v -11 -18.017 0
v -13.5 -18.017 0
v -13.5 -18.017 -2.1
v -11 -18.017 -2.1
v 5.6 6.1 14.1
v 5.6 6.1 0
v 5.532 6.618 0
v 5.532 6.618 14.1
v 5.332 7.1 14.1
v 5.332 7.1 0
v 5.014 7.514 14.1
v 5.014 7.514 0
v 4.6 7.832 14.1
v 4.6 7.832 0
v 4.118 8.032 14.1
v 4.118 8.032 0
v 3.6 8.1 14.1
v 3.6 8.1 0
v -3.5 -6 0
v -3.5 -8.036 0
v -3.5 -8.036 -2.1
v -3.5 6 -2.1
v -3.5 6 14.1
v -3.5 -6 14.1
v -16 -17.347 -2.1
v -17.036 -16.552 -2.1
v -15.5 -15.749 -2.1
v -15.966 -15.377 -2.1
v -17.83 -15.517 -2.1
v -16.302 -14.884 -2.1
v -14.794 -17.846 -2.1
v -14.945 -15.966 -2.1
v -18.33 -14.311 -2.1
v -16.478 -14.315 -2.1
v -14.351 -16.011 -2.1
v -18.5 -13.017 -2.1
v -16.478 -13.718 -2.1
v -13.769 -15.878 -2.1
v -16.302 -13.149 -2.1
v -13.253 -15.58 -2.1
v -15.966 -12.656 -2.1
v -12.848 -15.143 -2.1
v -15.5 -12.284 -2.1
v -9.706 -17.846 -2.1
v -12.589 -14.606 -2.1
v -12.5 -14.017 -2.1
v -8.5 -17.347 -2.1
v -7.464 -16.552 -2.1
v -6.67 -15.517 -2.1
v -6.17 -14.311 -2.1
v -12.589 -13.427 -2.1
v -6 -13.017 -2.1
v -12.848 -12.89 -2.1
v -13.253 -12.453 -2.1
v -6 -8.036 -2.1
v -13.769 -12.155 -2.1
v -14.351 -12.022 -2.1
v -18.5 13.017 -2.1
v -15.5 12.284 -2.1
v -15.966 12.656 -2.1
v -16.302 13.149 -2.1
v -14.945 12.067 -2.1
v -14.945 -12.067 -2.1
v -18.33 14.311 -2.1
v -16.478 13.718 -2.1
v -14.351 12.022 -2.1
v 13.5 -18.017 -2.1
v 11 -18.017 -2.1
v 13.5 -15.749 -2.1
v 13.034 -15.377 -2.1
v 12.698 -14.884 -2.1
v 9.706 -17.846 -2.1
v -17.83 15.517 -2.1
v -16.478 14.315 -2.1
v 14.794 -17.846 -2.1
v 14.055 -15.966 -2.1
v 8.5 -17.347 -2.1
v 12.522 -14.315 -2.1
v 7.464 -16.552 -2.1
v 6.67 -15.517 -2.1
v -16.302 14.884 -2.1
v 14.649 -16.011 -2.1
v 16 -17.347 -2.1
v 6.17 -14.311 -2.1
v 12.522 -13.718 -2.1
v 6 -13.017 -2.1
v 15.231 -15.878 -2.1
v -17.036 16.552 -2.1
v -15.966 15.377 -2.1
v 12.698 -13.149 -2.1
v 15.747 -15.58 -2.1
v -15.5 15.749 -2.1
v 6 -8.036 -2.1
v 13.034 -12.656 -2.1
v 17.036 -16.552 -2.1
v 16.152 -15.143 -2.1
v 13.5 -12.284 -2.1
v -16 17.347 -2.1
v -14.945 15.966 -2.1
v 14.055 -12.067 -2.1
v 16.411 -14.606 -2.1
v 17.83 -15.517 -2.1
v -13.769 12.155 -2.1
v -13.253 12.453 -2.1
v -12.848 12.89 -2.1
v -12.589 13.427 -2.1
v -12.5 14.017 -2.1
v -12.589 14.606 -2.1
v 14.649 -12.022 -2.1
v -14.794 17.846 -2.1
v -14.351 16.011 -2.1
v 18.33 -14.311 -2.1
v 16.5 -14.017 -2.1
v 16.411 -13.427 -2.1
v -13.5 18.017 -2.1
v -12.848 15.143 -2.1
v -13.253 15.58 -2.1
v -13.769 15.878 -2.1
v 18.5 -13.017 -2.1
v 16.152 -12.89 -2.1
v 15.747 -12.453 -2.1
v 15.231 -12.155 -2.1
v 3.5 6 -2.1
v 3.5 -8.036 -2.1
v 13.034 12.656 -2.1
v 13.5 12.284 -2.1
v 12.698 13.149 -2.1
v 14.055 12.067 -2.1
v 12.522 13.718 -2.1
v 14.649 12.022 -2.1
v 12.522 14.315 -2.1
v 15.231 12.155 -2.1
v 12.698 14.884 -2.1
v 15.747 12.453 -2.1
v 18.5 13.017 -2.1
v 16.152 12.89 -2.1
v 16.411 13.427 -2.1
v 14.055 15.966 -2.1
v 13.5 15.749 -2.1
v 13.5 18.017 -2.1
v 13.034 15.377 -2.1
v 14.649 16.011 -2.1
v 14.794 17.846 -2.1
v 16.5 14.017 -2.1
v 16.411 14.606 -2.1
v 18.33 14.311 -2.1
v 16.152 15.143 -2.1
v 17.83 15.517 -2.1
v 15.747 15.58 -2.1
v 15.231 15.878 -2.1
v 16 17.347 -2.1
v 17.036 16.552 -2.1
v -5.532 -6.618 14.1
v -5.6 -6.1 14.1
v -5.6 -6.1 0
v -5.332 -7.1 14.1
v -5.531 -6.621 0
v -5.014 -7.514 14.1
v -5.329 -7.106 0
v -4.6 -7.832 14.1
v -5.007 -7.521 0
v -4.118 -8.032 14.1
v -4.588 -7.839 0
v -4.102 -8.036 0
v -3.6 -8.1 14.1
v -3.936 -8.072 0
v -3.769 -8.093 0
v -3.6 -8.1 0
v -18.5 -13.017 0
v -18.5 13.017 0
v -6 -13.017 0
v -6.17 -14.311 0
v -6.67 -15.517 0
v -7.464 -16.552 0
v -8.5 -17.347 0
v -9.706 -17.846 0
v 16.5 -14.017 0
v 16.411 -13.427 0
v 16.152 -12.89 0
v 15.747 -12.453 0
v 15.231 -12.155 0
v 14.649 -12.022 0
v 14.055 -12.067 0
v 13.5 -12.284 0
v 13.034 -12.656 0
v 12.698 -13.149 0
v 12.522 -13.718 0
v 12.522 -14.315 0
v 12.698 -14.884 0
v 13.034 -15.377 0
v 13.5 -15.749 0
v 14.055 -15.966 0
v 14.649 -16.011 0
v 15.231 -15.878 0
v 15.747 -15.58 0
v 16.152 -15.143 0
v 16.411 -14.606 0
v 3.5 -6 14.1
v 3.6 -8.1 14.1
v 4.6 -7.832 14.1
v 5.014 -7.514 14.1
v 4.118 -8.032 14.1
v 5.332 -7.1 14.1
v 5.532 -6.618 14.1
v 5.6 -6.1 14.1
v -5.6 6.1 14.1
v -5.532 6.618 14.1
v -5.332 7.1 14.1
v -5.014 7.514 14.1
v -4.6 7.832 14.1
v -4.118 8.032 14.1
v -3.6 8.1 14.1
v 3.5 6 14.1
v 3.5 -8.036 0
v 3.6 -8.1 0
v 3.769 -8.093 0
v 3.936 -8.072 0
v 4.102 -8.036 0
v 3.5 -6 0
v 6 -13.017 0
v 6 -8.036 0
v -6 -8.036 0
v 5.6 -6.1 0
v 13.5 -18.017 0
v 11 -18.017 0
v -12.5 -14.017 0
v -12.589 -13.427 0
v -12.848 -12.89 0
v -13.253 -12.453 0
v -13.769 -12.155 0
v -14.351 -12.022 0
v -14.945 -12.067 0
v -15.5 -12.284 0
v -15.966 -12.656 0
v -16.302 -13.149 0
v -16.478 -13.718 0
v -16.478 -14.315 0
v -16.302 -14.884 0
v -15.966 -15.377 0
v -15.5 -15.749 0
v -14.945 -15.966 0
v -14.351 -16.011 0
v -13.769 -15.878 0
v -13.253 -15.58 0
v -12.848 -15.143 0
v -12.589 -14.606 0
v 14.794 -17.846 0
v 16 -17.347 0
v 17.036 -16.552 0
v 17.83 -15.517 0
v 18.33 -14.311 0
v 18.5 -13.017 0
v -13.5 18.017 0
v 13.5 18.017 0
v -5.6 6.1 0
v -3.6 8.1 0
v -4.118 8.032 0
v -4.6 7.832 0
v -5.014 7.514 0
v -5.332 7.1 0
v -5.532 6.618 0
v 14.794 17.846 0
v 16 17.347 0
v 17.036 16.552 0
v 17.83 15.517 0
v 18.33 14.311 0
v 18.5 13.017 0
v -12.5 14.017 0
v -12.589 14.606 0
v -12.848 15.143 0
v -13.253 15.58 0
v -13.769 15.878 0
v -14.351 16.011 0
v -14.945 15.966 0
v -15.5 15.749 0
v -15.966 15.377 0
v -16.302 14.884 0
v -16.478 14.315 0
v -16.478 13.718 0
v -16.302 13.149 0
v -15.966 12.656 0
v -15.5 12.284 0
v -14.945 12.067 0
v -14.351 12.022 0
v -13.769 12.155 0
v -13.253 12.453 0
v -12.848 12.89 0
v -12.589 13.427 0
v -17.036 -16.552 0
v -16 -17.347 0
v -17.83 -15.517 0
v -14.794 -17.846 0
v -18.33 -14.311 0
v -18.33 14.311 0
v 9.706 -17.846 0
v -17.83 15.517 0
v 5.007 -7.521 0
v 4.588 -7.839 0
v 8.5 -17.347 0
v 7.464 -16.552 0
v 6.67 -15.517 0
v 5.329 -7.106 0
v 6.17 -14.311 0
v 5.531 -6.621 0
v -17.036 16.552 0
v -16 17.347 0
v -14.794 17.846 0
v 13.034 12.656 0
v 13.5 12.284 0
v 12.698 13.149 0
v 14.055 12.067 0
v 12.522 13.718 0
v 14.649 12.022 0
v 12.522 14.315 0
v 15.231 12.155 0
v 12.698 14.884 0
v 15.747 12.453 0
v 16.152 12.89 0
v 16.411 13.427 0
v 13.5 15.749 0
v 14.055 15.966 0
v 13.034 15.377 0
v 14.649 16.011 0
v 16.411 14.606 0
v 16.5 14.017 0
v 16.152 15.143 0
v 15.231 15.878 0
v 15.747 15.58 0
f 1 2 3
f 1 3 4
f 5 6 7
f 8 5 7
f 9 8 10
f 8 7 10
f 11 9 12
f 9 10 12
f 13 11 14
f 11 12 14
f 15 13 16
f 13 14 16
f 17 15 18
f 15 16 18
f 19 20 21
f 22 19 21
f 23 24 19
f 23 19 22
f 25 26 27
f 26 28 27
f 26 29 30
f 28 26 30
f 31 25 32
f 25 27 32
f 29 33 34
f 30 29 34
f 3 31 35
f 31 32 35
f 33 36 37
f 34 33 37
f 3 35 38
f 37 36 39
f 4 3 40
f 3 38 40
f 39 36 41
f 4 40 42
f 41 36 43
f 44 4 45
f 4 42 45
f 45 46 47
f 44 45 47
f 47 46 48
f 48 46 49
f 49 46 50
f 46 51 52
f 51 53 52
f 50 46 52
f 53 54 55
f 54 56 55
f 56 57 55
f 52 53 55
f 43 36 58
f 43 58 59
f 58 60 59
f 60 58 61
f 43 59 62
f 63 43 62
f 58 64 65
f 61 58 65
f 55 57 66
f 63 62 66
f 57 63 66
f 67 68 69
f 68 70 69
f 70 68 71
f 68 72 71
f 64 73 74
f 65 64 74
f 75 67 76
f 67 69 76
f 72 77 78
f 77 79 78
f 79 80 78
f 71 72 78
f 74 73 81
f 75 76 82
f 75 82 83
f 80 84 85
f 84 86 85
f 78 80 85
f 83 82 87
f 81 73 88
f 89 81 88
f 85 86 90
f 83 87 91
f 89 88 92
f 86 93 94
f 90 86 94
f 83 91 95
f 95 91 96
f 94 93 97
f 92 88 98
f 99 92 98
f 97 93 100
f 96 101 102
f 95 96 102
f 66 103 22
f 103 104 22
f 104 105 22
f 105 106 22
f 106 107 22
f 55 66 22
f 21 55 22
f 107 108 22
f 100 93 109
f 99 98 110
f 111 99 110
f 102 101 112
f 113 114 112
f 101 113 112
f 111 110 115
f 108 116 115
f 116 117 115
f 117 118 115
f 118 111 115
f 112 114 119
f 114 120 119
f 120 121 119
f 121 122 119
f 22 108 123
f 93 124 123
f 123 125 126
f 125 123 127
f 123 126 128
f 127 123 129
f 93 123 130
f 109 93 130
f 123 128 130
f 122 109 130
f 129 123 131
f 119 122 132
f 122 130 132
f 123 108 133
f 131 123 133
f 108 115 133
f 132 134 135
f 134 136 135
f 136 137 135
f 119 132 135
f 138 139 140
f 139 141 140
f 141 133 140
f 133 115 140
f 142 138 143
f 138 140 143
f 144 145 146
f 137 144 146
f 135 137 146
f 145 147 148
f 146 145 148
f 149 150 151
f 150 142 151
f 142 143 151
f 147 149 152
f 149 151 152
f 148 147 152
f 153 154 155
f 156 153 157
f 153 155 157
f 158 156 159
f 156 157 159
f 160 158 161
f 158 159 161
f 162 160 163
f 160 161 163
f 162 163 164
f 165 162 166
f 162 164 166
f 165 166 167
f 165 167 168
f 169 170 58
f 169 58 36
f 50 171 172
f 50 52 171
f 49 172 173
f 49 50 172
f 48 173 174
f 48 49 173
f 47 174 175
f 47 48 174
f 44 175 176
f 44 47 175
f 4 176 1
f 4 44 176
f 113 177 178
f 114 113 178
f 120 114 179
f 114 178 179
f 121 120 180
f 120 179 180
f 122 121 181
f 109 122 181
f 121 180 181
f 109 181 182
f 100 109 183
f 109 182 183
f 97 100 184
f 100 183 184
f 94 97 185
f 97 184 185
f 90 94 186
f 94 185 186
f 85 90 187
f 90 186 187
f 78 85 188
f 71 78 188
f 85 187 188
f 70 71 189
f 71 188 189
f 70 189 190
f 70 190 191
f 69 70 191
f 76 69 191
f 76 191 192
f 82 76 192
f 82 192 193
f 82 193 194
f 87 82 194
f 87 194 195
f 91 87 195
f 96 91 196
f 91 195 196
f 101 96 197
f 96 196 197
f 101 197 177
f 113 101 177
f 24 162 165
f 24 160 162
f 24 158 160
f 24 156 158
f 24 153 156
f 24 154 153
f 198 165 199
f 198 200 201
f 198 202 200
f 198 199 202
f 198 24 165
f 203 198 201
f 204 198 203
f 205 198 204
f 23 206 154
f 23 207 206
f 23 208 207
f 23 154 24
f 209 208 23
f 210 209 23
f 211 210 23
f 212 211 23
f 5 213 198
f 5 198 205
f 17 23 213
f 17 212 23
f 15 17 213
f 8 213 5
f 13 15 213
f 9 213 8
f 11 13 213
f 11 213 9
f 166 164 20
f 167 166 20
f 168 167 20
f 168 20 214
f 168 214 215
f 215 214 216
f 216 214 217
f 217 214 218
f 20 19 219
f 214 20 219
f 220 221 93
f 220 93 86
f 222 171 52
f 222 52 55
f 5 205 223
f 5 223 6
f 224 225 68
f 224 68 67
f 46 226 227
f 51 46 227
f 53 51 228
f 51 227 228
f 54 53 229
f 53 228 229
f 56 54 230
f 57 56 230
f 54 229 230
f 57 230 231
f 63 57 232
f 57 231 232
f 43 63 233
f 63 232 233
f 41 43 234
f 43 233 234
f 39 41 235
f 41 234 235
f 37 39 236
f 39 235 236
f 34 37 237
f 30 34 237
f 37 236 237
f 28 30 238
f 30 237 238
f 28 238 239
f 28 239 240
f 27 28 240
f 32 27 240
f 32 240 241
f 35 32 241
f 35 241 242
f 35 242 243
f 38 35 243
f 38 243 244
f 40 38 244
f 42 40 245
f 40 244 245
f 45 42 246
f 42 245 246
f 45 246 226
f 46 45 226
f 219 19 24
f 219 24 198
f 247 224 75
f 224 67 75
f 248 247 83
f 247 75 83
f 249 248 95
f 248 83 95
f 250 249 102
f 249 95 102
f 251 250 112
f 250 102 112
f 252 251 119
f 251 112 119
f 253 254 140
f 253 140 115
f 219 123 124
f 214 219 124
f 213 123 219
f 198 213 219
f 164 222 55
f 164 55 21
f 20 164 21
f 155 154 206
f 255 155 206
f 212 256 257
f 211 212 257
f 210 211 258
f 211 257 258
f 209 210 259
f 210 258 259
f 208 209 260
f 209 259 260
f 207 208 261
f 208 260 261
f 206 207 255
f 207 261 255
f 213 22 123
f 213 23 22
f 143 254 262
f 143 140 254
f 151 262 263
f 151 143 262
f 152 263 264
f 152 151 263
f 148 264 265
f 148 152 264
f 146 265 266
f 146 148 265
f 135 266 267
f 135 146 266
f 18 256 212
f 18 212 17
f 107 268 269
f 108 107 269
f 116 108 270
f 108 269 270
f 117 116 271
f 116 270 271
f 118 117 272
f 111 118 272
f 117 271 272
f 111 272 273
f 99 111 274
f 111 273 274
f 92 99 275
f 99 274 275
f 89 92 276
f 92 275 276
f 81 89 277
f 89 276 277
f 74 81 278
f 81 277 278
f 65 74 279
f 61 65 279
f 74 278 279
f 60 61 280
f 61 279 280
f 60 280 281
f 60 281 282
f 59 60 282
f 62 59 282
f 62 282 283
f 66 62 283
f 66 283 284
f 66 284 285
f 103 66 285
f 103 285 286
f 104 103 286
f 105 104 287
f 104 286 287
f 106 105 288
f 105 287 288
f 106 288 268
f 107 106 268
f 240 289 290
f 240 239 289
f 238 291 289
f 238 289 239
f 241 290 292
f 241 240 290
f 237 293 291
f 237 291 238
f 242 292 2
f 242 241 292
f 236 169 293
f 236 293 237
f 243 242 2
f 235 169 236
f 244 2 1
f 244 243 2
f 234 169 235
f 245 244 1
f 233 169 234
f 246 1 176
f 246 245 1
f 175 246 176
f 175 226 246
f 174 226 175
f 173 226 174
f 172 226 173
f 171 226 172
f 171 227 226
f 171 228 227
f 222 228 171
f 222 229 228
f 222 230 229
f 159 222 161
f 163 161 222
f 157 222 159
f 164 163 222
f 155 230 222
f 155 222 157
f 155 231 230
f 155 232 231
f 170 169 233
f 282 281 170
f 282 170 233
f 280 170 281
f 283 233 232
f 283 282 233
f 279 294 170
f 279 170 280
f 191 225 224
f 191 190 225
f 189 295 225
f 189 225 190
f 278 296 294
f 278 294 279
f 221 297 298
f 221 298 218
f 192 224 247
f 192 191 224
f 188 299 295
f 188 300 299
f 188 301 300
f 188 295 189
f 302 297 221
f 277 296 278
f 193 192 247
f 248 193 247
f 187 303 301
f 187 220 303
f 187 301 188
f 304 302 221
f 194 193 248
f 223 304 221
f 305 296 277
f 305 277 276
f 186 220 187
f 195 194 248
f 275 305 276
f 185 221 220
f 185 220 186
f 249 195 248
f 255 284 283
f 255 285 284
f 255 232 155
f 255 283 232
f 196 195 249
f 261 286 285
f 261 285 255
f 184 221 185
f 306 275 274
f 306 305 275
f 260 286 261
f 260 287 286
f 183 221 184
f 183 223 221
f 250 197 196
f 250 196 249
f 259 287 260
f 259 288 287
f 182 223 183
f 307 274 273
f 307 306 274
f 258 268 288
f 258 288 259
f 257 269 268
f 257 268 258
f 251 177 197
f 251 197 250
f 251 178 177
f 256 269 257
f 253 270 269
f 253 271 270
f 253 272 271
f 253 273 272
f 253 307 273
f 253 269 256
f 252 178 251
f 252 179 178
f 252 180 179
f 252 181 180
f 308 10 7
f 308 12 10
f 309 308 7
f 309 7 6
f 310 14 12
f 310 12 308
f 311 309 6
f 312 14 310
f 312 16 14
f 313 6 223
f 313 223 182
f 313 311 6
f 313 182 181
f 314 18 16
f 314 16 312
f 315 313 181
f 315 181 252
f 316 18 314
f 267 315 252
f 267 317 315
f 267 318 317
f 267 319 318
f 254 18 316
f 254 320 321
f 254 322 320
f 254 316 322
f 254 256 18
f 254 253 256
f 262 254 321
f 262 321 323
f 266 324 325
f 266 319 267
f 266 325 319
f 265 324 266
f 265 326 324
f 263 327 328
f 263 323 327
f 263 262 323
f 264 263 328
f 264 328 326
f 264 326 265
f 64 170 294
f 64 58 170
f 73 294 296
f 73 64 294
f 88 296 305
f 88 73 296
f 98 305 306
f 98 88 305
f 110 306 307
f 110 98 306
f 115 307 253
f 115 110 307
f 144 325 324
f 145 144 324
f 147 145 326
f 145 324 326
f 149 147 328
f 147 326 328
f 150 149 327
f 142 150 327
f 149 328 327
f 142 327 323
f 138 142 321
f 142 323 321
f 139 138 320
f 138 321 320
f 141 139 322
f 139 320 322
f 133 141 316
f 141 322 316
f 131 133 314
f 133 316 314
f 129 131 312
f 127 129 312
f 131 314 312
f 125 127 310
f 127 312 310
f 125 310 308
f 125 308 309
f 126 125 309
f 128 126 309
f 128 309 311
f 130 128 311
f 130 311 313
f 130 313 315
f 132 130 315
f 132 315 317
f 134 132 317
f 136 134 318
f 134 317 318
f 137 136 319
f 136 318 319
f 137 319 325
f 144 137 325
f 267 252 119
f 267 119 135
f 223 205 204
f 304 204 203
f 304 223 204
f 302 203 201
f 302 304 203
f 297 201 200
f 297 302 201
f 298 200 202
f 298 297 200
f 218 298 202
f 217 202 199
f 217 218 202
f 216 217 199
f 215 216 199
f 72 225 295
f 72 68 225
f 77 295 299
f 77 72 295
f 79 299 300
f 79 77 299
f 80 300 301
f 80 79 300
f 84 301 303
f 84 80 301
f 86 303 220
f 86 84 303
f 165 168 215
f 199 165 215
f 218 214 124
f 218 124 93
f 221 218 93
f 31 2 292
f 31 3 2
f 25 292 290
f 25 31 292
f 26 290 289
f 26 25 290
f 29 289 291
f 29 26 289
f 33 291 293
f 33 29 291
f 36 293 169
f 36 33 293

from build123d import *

# Parameters (mm, degrees)
F0_W        = 11.2
F0_H        = 16.2
F0_W_2      = 7
F0_H_2      = 12
F1_DEPTH    = 14.1
F2_R        = 2
F3_DEPTH    = 2.1
F4_R        = 5
F5_T1_DEPTH = 19.1


# Not quite as in the source:
# - a fillet or chamfer that OpenCascade refuses, or shapes differently, is made with other operations: its cross-section is extruded or revolved along the edge and cut away or added


with BuildPart() as f1:
    # F0 (on Top) → F1 (new body)
    with BuildSketch(Plane.XY):
        Rectangle(F0_W, F0_H)
        Rectangle(F0_W_2, F0_H_2, mode=Mode.SUBTRACT)
    extrude(amount=F1_DEPTH)

    # F2 (on Top) → F3 (join)
    with BuildSketch(Plane.XY):
        Polygon((6, -18.0165283297), (18.5, -18.0165283297), (18.5, 0), (18.5, 18.0165283297), (-18.5, 18.0165283297), (-18.5, 0), (-18.5, -14.0165283297), (-18.5, -18.0165283297), (-14.5, -18.0165283297), (-6, -18.0165283297), (-6, -8.0361003056), (-3.5, -8.0361003056), (-3.5, -6), (-3.5, 0), (-3.5, 6), (3.5, 6), (3.5, 0), (3.5, -6), (3.5, -8.0361003056), (6, -8.0361003056), align=None)
        with Locations((-14.5, -14.0165283297)):
            Circle(F2_R, mode=Mode.SUBTRACT)
        with Locations((14.5, -14.0165283297)):
            Circle(F2_R, mode=Mode.SUBTRACT)
        with Locations((-14.5, 14.0165283297)):
            Circle(F2_R, mode=Mode.SUBTRACT)
        with Locations((14.5, 14.0165283297)):
            Circle(F2_R, mode=Mode.SUBTRACT)
    extrude(amount=-F3_DEPTH)

    # F4
    f4_edges = [f1.edges().sort_by_distance(p)[0] for p in [
        (-18.5, 18.016528, -1.05),
        (18.5, 18.016528, -1.05),
        (18.5, -18.016528, -1.05),
        (-18.5, -18.016528, -1.05),
        (6, -18.016528, -1.05),
        (-6, -18.016528, -1.05),
    ]]
    fillet(f4_edges, radius=F4_R)

    # F5: fillet of radius 2 on 4 edges, made by hand

    # F5_s2 → F5_t1 (cut)
    with BuildSketch(Plane.XY):
        with BuildLine():
            ThreePointArc((5.6, 6.1), (5.0142135624, 7.5142135624), (3.6, 8.1))
            Line((3.6, 8.1), (5.6, 8.1))
            Line((5.6, 8.1), (5.6, 6.1))
        make_face()
        with BuildLine():
            ThreePointArc((-3.6, 8.1), (-5.0142135624, 7.5142135624), (-5.6, 6.1))
            Line((-5.6, 6.1), (-5.6, 8.1))
            Line((-5.6, 8.1), (-3.6, 8.1))
        make_face()
        with BuildLine():
            ThreePointArc((5.6, -6.1), (5.0142135624, -7.5142135624), (3.6, -8.1))
            Line((3.6, -8.1), (5.6, -8.1))
            Line((5.6, -8.1), (5.6, -6.1))
        make_face()
        with BuildLine():
            ThreePointArc((-5.6, -6.1), (-5.0142135624, -7.5142135624), (-3.6, -8.1))
            Line((-3.6, -8.1), (-5.6, -8.1))
            Line((-5.6, -8.1), (-5.6, -6.1))
        make_face()
    extrude(amount=F5_T1_DEPTH, mode=Mode.SUBTRACT)


solid = f1.part
